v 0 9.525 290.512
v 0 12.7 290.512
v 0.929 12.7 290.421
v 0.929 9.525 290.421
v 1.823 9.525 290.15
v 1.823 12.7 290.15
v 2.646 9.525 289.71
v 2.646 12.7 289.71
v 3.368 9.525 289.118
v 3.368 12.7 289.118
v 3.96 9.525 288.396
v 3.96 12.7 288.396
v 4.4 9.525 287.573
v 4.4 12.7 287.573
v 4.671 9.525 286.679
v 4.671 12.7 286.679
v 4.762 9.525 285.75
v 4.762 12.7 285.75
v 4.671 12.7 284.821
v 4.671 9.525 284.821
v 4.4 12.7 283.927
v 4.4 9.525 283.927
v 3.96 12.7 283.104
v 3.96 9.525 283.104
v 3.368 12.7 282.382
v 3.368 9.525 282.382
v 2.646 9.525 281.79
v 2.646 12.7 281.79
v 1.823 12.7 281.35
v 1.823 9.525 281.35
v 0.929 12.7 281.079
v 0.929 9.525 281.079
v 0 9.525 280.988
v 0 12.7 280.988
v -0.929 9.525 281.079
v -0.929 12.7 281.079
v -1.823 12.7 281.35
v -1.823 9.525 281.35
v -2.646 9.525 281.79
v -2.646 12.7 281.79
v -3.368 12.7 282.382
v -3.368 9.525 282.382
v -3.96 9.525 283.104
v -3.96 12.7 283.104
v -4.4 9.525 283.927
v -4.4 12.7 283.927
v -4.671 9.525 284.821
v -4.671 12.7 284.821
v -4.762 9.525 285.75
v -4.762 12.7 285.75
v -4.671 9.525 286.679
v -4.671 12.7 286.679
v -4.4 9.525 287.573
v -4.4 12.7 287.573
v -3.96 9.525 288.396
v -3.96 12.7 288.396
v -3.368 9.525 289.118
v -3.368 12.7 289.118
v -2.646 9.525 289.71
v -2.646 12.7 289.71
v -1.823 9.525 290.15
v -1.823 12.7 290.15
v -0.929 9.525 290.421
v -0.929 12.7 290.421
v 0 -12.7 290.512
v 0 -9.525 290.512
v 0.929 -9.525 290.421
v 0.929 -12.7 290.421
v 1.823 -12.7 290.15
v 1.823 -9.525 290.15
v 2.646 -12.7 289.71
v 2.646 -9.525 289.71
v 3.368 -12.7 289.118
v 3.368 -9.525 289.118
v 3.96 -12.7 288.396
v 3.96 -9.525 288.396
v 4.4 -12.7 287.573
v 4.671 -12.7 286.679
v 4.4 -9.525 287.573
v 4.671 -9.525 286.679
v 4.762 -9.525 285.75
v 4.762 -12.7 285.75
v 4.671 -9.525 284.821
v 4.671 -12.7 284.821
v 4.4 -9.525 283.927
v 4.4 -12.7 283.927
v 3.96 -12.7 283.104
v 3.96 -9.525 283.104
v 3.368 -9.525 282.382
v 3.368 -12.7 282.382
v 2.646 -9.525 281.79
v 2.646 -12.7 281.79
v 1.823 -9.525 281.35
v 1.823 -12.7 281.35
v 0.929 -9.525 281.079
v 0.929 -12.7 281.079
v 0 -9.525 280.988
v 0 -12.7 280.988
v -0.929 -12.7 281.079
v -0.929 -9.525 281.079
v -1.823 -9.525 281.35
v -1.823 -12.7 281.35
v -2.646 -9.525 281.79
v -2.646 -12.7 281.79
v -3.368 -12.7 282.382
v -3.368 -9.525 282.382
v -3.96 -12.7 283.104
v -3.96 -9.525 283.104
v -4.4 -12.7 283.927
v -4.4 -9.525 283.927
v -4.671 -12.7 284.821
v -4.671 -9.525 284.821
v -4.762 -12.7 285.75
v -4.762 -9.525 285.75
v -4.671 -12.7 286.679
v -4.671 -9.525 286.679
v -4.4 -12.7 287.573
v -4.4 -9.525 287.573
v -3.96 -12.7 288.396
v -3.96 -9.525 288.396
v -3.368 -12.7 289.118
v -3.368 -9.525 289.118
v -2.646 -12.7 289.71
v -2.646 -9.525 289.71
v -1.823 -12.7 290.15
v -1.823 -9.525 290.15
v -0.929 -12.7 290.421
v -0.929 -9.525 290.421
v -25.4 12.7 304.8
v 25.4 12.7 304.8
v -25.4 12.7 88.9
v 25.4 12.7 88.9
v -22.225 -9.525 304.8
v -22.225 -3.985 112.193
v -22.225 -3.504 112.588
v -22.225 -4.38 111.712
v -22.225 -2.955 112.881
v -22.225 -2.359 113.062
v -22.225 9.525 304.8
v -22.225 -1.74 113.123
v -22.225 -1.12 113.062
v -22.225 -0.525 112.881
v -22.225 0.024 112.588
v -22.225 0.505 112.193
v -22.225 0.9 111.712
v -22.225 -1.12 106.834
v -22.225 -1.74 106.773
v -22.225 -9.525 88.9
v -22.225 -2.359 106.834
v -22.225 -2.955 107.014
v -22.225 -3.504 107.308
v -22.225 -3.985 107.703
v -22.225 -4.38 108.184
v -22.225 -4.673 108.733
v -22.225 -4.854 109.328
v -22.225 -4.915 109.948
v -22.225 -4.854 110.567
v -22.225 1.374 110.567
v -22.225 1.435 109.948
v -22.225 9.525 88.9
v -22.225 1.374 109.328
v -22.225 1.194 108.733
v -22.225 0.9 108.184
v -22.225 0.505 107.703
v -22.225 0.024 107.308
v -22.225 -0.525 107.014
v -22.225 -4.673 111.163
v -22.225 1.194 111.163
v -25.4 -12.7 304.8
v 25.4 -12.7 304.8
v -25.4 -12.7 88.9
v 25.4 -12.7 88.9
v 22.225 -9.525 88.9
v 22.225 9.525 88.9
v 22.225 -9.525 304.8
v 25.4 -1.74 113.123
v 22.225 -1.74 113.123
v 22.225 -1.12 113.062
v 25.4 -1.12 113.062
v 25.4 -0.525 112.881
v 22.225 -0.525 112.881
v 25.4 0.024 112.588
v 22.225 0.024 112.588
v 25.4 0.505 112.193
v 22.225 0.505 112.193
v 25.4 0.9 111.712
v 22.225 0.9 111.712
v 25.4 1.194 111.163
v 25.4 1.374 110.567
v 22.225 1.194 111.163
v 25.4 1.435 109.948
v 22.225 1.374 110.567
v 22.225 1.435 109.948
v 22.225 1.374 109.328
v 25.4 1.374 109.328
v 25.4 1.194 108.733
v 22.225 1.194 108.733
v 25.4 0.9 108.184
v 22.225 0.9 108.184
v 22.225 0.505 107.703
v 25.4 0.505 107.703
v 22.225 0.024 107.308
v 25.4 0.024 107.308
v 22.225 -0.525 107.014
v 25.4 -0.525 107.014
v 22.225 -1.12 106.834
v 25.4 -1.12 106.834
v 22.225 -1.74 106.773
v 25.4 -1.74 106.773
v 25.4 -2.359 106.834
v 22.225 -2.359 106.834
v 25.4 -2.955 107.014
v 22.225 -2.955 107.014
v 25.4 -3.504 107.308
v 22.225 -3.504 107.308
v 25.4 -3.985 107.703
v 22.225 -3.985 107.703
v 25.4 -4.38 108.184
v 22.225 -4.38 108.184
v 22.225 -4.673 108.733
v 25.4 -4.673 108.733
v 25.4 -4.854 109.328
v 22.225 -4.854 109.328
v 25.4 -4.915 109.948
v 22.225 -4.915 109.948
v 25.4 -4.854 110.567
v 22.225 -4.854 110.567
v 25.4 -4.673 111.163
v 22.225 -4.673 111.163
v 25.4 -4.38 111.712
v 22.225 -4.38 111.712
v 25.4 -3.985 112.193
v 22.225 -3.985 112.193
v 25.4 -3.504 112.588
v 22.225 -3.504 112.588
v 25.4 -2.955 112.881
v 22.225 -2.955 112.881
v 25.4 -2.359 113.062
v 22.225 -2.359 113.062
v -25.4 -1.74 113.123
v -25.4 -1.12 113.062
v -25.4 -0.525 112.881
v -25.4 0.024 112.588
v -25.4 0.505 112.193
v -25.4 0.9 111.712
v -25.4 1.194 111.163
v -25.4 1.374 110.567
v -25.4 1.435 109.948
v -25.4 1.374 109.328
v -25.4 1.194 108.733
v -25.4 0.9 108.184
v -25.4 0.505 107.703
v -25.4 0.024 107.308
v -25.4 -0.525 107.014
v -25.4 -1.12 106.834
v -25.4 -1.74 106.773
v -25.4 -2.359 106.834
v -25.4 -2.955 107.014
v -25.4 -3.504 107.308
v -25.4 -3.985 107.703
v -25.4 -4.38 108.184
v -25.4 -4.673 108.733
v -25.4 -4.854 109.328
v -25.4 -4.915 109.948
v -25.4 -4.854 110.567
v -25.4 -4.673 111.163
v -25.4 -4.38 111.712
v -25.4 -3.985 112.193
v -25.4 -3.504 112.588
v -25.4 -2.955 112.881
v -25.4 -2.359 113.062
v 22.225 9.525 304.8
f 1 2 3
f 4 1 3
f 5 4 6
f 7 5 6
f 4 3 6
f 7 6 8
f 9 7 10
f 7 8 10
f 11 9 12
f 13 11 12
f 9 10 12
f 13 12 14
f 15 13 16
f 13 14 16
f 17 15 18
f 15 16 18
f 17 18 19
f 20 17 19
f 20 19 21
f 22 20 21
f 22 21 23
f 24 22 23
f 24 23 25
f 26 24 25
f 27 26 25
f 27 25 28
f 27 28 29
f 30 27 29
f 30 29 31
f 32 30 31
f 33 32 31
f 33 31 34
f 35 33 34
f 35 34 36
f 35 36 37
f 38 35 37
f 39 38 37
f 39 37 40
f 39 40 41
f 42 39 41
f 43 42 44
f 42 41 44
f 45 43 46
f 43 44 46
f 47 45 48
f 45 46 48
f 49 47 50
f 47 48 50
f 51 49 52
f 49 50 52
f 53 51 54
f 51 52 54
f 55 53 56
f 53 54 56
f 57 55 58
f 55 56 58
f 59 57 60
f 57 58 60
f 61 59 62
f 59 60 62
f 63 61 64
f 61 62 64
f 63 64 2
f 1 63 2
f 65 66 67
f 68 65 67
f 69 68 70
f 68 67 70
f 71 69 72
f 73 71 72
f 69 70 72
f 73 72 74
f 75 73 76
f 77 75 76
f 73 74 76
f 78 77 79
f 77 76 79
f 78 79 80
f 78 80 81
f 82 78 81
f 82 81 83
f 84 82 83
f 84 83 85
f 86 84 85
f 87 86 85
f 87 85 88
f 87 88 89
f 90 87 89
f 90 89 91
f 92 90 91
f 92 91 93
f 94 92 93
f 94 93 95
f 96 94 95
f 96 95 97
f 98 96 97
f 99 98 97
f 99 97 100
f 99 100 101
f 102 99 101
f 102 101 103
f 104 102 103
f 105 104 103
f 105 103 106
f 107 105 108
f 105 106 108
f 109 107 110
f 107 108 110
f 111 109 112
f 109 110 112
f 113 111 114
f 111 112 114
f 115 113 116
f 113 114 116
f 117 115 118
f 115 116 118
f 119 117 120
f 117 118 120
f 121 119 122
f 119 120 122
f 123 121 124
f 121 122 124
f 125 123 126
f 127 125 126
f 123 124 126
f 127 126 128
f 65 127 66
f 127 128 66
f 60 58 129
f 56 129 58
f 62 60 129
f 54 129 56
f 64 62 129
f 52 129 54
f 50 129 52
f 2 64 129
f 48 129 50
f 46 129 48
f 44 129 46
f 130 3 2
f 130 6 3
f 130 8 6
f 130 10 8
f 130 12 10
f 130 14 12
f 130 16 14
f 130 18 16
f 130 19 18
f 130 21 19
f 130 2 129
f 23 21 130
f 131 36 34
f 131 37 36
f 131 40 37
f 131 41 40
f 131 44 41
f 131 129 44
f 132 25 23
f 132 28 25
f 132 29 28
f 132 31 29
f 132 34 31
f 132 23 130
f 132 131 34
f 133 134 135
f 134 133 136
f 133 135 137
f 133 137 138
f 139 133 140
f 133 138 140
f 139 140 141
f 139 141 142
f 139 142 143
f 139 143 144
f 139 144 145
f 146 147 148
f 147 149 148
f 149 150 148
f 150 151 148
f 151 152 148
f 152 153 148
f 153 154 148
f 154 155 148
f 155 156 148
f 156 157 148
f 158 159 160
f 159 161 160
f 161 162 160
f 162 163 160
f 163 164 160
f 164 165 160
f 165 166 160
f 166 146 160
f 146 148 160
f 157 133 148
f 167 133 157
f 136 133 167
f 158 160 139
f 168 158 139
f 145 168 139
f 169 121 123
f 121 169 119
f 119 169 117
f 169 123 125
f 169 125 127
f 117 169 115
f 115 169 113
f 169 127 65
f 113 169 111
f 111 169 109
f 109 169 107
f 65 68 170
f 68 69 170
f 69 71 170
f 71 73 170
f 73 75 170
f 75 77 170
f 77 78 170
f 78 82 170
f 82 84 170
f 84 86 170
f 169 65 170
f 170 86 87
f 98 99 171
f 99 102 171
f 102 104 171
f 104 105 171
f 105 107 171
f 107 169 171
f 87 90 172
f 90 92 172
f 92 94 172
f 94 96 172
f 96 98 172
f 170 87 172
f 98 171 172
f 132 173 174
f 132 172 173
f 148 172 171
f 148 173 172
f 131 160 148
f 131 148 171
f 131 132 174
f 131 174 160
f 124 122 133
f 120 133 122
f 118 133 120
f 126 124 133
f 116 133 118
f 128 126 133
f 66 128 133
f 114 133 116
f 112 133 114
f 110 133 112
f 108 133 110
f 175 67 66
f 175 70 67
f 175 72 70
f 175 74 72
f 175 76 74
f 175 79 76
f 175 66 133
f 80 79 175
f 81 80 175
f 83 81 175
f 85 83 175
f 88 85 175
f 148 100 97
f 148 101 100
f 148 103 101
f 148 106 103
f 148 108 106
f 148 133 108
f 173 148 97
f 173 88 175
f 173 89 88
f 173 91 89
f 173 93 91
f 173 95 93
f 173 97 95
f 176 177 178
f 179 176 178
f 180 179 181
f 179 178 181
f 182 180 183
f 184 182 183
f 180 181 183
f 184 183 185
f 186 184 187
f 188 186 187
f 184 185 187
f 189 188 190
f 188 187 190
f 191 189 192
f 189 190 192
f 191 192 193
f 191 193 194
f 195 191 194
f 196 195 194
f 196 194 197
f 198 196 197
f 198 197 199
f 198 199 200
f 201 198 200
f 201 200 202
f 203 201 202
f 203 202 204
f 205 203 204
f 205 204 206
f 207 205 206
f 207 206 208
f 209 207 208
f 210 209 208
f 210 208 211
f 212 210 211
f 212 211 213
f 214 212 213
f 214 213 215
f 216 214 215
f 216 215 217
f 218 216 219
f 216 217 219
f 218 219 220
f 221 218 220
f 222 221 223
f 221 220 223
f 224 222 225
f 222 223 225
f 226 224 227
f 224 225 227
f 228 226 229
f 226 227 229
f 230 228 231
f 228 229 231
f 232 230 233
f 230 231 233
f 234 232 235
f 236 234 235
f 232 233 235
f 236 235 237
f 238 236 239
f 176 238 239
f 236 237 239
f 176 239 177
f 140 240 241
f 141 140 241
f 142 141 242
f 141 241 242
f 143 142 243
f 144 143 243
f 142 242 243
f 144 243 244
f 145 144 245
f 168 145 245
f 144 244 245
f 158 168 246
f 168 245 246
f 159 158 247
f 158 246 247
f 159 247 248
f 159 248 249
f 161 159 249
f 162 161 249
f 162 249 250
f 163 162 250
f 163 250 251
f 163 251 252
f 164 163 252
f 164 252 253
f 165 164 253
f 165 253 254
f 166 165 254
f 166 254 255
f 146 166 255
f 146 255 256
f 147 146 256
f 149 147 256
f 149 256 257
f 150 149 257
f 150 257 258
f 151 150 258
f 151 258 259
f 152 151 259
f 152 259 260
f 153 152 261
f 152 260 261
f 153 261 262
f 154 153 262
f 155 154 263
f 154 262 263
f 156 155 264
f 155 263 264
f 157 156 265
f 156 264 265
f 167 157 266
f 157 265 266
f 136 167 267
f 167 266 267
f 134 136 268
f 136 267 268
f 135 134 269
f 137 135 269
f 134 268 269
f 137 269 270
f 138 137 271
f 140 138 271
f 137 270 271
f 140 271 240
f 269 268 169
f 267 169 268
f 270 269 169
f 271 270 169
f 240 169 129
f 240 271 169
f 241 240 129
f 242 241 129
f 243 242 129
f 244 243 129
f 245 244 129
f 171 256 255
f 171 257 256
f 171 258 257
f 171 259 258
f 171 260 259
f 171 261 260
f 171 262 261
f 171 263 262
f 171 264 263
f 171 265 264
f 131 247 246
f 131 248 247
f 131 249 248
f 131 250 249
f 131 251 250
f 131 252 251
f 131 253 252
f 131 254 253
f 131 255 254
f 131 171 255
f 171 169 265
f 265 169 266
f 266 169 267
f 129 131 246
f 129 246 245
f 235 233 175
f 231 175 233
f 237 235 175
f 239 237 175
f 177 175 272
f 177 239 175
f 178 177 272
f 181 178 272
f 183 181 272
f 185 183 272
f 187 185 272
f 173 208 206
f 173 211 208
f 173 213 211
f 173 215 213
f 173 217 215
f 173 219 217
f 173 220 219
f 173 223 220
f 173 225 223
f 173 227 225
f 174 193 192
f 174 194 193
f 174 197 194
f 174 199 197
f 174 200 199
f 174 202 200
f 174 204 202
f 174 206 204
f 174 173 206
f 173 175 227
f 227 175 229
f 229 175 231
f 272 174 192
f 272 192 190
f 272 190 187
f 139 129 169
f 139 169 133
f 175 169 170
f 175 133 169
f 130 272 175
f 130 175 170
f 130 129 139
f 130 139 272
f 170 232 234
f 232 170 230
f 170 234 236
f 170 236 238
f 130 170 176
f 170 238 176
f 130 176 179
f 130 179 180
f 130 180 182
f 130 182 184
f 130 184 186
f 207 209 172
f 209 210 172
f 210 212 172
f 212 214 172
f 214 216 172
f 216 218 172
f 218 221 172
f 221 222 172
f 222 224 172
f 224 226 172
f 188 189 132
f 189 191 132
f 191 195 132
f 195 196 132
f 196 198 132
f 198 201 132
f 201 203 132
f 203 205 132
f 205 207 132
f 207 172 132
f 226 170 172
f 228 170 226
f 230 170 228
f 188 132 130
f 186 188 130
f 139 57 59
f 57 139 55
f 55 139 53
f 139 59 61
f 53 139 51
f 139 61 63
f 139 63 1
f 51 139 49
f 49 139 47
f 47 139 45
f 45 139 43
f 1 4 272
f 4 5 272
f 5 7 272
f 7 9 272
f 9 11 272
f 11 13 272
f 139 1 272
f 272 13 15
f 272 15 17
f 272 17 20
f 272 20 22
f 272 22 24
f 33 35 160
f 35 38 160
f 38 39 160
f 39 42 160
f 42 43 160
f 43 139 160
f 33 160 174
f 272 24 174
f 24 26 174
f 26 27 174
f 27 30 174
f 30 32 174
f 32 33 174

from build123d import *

# Parameters (mm, degrees)
SKETCH1_W           = 50.8
SKETCH1_H           = 25.4
SKETCH1_W_2         = 44.45
SKETCH1_H_2         = 19.05
BOSS_EXTRUDE1_DEPTH = 304.8
SKETCH2_R           = 4.7625
CUT_EXTRUDE1_DEPTH  = 307.909367729
SKETCH3_R           = 3.175
CUT_EXTRUDE2_DEPTH  = 310.265209812
SKETCH4_W           = 50.8
SKETCH4_H           = 25.4
CUT_EXTRUDE3_DEPTH  = 88.9


with BuildPart() as part:
    # Sketch1 → Boss-Extrude1 (new body)
    with BuildSketch(Plane.XY):
        Rectangle(SKETCH1_W, SKETCH1_H)
        Rectangle(SKETCH1_W_2, SKETCH1_H_2, mode=Mode.SUBTRACT)
    extrude(amount=BOSS_EXTRUDE1_DEPTH)

    # Sketch2 → Cut-Extrude1 (cut, through all)
    with BuildSketch(Plane(origin=(0, 12.7, 0), x_dir=(1, 0, 0), z_dir=(0, 1, 0))):
        with Locations(Location((0, -285.75, 0), (0, 0, 270))):
            Circle(SKETCH2_R)
    extrude(amount=-CUT_EXTRUDE1_DEPTH, mode=Mode.SUBTRACT)

    # Sketch3 → Cut-Extrude2 (cut, through all)
    with BuildSketch(Plane.ZY.offset(25.4)):
        with Locations((109.947638526, -1.739817444)):
            Circle(SKETCH3_R)
    extrude(amount=-CUT_EXTRUDE2_DEPTH, mode=Mode.SUBTRACT)

    # Sketch4 → Cut-Extrude3 (cut)
    with BuildSketch(Plane(origin=(0, 0, 0), x_dir=(-1, 0, 0), z_dir=(0, 0, -1))):
        Rectangle(SKETCH4_W, SKETCH4_H)
    extrude(amount=-CUT_EXTRUDE3_DEPTH, mode=Mode.SUBTRACT)


solid = part.part
